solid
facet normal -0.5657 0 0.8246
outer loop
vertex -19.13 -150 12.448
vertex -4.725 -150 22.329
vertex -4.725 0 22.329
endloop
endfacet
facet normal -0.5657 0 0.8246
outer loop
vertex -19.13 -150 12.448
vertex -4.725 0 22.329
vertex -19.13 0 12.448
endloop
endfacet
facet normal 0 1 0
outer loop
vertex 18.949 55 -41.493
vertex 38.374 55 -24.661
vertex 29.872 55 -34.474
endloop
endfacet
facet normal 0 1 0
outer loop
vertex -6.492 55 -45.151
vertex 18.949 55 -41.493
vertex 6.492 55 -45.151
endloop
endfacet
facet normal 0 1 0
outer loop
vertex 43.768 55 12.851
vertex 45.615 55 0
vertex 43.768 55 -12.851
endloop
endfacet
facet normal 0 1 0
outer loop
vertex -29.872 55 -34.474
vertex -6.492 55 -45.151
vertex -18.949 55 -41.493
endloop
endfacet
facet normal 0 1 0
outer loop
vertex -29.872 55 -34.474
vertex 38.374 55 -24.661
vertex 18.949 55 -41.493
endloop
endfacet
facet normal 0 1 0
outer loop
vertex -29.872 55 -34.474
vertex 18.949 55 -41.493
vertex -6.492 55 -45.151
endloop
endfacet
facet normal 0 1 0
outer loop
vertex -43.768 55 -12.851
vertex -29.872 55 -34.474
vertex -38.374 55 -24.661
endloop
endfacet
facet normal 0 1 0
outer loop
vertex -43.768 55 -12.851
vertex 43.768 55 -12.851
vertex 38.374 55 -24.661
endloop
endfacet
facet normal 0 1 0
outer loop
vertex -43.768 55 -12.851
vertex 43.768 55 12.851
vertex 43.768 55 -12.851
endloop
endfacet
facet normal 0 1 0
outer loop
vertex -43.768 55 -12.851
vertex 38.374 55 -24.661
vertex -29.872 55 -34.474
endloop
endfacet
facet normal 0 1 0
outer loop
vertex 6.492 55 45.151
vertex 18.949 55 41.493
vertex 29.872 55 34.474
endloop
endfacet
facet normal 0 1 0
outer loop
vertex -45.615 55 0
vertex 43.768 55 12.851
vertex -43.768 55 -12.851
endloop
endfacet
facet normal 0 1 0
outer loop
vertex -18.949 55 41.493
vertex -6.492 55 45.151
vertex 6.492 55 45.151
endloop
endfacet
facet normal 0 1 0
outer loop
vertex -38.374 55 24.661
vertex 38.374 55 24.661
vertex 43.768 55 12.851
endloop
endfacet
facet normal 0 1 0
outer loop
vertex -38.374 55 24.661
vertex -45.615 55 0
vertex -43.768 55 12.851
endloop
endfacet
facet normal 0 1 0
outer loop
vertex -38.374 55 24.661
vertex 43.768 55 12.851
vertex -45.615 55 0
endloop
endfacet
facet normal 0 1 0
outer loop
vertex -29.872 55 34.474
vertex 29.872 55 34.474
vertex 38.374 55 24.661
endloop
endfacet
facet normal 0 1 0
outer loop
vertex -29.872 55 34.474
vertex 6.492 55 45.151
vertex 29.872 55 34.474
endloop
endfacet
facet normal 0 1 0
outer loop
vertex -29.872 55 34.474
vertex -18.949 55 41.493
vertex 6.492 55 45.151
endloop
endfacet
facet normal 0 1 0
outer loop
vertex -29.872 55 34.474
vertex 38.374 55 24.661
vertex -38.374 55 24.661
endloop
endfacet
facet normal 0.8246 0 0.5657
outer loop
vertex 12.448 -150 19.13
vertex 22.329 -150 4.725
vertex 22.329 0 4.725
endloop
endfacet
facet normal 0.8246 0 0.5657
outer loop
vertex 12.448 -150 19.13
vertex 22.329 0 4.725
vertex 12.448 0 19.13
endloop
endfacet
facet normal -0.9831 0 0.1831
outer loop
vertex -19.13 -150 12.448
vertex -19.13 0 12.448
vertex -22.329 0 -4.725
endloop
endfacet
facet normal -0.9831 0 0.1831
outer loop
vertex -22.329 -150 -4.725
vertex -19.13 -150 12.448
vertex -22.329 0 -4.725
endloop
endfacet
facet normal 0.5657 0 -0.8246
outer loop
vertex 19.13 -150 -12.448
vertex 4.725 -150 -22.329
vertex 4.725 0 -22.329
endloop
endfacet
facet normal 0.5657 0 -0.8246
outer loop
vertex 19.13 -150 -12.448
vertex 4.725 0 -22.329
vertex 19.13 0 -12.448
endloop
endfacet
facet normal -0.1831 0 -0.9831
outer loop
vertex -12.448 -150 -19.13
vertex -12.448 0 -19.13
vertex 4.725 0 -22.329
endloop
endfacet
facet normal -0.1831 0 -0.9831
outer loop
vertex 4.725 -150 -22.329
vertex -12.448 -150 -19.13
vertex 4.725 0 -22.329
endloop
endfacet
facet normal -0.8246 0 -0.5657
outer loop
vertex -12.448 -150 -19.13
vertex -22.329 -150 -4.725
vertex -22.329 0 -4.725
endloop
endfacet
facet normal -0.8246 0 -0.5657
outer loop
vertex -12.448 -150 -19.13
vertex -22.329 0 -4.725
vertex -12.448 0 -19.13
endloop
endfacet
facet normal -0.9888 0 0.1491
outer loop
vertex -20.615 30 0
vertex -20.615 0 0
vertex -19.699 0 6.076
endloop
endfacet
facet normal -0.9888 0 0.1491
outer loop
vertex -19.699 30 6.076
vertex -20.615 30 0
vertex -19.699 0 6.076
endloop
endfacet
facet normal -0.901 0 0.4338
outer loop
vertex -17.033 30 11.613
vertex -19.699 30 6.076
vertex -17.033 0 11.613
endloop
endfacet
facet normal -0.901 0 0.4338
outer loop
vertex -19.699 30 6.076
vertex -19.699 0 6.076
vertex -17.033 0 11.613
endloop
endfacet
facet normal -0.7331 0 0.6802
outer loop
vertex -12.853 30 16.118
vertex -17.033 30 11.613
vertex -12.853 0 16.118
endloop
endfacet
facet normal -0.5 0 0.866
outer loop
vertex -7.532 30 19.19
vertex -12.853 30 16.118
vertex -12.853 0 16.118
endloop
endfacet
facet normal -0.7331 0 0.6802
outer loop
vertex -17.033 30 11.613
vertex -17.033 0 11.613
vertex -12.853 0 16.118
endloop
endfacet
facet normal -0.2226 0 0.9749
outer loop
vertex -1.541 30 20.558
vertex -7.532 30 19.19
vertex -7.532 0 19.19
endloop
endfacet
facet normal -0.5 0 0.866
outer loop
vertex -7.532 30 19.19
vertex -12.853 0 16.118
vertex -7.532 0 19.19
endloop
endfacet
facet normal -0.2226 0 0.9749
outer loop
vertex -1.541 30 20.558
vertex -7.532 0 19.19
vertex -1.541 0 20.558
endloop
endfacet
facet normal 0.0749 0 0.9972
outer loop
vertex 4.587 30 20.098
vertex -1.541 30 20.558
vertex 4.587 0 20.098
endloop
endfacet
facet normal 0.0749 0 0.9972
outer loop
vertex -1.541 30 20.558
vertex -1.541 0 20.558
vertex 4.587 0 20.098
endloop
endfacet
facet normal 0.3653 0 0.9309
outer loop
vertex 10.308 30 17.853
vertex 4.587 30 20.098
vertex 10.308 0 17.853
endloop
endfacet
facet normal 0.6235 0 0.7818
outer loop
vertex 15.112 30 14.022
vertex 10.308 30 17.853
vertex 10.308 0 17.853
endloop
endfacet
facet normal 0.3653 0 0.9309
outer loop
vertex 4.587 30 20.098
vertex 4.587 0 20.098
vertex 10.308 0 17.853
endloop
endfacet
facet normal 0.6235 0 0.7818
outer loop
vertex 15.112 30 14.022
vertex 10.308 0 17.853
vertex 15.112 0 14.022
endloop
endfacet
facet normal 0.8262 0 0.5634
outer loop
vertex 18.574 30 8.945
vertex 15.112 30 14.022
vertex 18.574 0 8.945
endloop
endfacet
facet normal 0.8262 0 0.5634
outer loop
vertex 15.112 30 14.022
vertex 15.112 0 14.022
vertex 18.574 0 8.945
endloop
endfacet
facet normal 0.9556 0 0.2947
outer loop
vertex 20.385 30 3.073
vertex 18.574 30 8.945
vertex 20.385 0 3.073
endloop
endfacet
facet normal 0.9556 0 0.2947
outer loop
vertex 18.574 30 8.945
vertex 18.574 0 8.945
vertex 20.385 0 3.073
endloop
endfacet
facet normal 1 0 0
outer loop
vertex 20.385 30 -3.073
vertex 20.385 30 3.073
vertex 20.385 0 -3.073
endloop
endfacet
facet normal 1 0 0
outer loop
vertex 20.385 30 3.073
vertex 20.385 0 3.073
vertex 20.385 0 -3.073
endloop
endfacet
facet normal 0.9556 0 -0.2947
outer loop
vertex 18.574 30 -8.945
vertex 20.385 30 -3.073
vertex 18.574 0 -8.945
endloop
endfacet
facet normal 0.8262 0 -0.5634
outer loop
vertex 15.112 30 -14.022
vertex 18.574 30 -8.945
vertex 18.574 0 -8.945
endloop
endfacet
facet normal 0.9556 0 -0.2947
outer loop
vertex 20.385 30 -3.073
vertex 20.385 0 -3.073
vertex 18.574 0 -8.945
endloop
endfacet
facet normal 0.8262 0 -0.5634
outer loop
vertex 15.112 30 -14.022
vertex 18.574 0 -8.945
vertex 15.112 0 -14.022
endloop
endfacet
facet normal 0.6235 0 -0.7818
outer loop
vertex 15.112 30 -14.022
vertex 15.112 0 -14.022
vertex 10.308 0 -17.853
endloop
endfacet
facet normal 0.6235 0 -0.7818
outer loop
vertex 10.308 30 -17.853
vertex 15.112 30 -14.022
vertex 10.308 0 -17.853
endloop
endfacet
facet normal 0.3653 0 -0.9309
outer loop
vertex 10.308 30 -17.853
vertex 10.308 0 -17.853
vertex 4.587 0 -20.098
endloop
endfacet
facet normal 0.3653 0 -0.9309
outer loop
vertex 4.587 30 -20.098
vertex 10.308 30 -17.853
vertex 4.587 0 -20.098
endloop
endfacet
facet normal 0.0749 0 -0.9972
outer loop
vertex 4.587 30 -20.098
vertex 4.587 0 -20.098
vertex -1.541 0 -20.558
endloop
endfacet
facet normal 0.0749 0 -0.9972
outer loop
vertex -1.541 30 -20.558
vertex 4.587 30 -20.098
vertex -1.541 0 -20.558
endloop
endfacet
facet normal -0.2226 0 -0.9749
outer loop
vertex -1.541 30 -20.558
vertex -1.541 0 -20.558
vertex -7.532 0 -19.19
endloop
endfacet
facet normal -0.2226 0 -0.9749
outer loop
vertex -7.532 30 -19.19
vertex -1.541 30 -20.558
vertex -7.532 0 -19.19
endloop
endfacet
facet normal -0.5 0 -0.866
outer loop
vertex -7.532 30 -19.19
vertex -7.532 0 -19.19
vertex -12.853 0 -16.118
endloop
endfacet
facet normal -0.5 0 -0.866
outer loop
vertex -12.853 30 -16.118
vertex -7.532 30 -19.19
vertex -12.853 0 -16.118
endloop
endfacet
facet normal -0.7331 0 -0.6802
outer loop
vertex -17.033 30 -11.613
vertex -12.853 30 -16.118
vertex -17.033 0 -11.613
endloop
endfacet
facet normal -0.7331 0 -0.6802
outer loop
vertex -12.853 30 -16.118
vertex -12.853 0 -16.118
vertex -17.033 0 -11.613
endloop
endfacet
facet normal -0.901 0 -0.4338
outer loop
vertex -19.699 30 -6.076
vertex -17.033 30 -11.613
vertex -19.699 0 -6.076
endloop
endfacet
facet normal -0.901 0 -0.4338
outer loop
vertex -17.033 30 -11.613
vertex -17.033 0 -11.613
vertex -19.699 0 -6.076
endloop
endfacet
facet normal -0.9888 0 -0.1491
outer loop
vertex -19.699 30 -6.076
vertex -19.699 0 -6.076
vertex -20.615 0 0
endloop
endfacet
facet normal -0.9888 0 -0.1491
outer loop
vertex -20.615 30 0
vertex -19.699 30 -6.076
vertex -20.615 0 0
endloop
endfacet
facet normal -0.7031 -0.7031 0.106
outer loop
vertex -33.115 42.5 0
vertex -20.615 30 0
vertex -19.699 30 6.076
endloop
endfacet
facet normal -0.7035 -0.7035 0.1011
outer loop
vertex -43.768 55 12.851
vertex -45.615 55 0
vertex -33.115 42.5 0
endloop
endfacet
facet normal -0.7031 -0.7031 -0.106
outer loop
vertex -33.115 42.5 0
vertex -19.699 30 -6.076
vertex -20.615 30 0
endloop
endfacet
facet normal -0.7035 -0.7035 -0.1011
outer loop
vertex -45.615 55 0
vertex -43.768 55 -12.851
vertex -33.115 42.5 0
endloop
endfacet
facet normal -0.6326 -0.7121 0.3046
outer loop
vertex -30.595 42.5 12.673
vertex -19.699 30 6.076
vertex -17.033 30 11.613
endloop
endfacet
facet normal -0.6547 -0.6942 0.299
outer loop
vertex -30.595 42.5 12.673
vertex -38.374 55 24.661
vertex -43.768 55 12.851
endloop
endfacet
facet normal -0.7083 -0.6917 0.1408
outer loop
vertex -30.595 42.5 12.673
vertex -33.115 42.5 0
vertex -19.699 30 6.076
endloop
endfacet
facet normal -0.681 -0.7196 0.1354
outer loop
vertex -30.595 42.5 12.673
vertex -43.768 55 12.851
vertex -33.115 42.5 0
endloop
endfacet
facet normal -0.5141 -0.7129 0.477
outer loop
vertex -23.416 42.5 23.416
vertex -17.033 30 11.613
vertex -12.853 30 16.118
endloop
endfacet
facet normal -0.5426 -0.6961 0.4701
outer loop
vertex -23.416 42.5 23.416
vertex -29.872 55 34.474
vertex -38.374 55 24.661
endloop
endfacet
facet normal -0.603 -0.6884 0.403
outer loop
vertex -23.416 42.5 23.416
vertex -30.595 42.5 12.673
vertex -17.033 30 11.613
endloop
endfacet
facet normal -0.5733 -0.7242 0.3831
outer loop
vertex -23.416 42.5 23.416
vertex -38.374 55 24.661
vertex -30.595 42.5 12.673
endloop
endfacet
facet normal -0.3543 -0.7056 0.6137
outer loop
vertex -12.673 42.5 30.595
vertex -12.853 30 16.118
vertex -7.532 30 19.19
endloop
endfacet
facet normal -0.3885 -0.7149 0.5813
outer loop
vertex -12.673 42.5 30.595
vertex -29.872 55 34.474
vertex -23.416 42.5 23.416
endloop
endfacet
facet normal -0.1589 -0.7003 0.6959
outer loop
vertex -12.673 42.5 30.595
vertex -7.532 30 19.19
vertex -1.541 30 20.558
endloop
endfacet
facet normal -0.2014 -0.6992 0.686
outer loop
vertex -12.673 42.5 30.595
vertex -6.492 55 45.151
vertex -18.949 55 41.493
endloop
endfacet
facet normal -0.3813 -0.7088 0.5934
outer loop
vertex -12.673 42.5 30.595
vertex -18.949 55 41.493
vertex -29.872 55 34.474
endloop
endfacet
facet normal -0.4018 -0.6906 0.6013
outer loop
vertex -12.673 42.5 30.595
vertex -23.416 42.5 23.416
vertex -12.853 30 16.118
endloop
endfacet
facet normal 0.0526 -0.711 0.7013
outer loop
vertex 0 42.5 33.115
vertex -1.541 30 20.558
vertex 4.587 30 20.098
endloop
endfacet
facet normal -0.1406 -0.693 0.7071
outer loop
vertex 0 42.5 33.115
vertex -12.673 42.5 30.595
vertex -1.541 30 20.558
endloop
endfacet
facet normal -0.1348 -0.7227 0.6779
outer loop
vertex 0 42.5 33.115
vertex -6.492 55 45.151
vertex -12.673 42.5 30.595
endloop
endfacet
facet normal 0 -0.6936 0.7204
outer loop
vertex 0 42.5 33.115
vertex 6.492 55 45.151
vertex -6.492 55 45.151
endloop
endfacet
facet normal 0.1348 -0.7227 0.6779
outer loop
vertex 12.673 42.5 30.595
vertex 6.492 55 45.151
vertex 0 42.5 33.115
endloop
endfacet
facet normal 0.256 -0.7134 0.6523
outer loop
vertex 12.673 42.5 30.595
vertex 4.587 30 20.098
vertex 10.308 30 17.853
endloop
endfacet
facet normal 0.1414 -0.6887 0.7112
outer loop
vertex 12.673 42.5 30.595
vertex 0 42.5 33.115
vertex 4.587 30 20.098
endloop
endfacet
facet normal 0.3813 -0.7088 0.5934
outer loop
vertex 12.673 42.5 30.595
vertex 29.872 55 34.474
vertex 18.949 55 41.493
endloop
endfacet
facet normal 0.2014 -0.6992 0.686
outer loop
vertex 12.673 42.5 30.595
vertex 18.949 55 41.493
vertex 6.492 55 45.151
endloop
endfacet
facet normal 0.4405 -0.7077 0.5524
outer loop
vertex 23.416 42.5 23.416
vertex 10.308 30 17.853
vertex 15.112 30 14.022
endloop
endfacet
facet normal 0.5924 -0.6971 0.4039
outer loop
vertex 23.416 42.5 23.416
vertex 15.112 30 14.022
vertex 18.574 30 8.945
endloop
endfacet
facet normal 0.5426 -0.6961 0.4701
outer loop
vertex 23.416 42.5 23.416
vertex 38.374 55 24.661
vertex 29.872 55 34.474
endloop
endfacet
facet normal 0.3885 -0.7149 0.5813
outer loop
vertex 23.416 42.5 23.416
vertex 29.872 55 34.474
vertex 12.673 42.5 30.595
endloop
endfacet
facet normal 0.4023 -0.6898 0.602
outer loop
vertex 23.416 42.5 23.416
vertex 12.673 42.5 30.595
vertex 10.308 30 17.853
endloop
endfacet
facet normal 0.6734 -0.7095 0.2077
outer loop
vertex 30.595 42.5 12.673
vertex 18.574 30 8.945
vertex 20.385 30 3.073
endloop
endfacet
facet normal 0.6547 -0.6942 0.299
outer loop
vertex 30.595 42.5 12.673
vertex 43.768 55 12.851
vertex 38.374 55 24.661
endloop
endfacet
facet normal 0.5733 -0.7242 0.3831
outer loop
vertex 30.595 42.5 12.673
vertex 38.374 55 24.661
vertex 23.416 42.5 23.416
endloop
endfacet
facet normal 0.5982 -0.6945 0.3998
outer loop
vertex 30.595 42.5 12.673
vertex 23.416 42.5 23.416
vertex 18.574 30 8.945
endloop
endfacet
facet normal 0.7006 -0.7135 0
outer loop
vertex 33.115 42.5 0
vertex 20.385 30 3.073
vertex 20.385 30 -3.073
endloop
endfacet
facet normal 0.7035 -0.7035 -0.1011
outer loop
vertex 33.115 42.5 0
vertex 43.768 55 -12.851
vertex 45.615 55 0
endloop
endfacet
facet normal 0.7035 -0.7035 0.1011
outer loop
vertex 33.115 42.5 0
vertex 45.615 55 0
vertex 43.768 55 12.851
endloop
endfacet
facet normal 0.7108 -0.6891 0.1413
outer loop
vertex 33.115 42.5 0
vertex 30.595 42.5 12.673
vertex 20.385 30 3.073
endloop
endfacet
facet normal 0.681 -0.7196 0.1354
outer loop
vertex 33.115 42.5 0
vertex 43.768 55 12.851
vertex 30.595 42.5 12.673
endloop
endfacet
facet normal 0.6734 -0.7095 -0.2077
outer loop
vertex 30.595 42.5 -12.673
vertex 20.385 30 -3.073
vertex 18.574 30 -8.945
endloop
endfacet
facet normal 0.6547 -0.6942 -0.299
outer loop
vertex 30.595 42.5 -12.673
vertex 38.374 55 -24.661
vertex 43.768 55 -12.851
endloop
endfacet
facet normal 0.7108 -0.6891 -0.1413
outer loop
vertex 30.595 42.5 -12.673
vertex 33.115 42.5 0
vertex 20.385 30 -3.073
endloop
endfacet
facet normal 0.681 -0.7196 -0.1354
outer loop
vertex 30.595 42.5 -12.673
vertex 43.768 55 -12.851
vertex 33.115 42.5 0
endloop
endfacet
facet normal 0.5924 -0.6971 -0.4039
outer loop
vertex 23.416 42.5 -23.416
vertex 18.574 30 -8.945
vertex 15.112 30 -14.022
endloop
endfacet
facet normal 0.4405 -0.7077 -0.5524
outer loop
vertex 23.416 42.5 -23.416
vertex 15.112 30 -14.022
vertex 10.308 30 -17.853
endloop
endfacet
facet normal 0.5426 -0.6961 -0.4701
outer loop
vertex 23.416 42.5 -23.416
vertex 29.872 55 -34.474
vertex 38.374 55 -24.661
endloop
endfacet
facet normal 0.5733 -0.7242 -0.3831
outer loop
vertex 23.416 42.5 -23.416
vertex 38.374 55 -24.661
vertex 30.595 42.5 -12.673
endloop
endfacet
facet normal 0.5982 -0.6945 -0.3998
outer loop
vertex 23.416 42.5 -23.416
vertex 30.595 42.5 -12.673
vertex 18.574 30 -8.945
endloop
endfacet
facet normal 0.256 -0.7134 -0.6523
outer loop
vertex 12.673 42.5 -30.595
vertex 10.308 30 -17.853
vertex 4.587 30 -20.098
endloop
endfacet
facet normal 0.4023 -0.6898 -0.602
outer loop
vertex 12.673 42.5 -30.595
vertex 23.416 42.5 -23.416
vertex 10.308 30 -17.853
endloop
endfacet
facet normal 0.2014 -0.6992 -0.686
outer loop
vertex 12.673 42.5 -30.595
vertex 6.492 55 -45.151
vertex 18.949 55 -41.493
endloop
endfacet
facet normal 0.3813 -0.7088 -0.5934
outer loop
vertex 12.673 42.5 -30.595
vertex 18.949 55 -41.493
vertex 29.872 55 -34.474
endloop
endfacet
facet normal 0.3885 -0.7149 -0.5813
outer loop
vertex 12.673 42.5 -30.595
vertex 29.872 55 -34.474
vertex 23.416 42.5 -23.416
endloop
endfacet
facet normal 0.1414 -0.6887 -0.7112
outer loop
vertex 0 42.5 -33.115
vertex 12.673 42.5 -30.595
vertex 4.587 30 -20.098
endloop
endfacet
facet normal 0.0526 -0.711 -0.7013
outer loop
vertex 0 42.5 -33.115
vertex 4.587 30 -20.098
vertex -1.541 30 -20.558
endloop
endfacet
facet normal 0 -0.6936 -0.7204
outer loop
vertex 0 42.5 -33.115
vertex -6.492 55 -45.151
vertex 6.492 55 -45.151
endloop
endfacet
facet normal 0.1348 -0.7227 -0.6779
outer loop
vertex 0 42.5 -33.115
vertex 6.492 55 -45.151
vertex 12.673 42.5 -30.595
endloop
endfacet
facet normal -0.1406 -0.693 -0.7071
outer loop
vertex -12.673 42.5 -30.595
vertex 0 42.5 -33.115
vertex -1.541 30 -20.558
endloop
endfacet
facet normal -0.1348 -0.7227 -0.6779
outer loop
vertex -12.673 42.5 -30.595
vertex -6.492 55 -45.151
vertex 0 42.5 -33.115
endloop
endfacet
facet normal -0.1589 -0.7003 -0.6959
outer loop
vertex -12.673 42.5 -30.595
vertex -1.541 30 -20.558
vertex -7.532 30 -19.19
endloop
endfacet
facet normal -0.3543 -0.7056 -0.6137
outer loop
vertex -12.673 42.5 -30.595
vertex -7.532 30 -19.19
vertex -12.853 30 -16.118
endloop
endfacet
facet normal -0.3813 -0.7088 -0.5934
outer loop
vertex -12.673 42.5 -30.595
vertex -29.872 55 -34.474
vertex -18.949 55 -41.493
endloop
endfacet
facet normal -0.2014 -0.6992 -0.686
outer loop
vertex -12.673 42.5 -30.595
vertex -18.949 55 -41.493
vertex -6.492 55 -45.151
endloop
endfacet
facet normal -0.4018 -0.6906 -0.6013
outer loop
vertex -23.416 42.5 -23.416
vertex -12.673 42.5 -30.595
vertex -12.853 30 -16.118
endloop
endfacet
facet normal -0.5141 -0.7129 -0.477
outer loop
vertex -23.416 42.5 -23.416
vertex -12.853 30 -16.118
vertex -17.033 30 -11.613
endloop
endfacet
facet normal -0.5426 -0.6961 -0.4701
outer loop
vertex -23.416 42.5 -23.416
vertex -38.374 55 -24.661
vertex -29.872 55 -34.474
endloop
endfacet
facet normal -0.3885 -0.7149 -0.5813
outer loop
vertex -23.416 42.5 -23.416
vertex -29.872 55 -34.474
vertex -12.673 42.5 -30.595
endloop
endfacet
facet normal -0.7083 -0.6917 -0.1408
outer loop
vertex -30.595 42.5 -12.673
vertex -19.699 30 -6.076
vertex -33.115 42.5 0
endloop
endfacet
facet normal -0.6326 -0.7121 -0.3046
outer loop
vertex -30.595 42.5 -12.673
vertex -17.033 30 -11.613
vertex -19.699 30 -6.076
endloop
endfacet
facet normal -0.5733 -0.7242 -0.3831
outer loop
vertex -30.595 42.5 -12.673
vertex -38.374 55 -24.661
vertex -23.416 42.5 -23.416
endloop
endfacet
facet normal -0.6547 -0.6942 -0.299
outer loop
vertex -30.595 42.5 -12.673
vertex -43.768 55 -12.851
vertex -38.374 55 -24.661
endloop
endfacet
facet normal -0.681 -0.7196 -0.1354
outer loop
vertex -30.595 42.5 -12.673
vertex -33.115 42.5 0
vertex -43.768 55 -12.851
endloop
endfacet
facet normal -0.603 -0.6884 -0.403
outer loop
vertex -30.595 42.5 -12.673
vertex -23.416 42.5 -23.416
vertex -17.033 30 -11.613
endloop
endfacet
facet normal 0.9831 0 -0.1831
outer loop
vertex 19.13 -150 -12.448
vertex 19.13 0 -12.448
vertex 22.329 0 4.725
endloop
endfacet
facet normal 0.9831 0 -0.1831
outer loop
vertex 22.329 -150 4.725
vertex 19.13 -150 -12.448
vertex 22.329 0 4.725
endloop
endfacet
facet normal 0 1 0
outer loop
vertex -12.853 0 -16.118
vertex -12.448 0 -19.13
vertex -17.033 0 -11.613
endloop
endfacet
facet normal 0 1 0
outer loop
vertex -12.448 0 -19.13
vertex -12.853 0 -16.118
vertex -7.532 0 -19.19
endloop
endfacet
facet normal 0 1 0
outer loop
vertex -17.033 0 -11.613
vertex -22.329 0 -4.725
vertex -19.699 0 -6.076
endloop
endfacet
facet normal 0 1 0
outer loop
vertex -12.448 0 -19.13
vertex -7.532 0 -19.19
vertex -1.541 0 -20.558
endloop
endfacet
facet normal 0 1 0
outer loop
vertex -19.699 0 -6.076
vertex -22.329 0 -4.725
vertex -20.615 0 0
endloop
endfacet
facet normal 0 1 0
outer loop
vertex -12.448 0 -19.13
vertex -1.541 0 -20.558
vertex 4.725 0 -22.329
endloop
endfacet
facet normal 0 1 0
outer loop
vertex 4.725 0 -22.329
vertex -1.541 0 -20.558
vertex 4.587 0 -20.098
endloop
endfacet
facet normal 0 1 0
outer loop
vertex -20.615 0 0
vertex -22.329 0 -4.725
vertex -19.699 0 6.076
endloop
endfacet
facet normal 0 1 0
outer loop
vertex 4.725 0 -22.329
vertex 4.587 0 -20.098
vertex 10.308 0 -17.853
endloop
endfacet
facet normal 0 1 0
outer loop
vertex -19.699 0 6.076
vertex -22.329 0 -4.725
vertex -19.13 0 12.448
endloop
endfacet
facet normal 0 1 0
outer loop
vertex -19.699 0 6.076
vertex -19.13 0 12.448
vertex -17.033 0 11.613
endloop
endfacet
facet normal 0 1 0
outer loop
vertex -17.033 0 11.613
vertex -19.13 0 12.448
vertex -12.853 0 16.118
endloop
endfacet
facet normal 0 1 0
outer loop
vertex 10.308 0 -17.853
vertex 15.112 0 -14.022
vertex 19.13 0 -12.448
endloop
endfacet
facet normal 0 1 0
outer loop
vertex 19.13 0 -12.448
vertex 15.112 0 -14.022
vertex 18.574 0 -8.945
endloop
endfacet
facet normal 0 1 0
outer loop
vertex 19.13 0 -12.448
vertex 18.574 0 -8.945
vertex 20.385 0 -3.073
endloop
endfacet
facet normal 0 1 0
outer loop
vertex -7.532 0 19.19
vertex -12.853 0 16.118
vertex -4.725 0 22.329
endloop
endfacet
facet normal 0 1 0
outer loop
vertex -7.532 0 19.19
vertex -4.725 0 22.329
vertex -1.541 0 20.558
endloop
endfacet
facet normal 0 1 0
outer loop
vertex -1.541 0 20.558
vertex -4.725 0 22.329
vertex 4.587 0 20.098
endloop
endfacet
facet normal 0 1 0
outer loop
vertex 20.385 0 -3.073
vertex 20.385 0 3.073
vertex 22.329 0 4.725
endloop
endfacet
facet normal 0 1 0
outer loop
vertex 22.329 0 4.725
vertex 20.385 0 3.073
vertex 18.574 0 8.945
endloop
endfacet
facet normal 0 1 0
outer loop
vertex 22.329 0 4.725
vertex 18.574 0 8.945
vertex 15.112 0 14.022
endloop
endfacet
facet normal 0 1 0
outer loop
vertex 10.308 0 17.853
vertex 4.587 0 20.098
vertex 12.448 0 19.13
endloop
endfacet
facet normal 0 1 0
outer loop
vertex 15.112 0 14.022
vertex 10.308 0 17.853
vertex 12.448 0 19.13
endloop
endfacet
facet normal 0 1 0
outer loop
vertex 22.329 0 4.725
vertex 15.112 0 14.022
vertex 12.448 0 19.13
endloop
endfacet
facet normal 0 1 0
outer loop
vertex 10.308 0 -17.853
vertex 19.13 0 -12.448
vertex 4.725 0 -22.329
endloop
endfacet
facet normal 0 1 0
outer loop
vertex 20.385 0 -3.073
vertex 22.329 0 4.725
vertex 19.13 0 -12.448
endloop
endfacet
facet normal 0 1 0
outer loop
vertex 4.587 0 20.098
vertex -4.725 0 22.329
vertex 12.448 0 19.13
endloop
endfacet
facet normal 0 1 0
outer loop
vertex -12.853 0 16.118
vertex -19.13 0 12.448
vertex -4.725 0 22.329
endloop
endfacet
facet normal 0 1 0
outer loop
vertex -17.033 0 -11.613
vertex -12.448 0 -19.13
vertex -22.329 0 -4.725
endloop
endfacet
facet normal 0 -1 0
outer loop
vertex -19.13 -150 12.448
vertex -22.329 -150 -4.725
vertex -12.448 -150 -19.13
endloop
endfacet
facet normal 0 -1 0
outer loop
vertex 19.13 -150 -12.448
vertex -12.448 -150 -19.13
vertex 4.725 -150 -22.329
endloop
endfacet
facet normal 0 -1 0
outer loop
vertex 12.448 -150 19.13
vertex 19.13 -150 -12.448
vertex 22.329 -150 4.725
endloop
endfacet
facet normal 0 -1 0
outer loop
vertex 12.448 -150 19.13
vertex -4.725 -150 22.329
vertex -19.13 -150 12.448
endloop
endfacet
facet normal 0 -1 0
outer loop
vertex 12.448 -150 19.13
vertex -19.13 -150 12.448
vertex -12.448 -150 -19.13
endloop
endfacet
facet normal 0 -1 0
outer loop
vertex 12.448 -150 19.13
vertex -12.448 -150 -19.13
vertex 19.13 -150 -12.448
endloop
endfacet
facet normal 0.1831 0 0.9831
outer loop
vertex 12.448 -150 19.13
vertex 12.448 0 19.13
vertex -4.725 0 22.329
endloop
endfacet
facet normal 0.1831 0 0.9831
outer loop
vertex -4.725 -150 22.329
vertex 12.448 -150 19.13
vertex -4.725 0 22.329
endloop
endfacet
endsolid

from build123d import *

# Parameters (mm, degrees)
F1_DEPTH  = 150
F2_R      = 20.6152991637
F3_DEPTH  = 30
F3_FACE_R = 20.6152991637
F4_DEPTH  = 25
F4_TAPER  = -45


with BuildPart() as f1:
    # F0 (on Front) → F1 (new body)
    with BuildSketch(Plane.XZ):
        Polygon((4.725022344, -22.3287471763), (19.1299038845, -12.447713203), (22.3287471763, 4.725022344), (12.447713203, 19.1299038845), (-4.725022344, 22.3287471763), (-19.1299038845, 12.447713203), (-22.3287471763, -4.725022344), (-12.447713203, -19.1299038845), align=None)
    extrude(amount=F1_DEPTH)

    # F2 (on face) → F3 (join)
    with BuildSketch(Plane(origin=(0, 0, 0), x_dir=(-1, 0, 0), z_dir=(0, 1, 0))):
        Circle(F2_R)
    extrude(amount=F3_DEPTH)

    # F3_face (on face) → F4 (join)
    with BuildSketch(Plane(origin=(0, 30, 0), x_dir=(-1, 0, 0), z_dir=(0, 1, 0))):
        Circle(F3_FACE_R)
    extrude(amount=F4_DEPTH, taper=F4_TAPER)


solid = f1.part
